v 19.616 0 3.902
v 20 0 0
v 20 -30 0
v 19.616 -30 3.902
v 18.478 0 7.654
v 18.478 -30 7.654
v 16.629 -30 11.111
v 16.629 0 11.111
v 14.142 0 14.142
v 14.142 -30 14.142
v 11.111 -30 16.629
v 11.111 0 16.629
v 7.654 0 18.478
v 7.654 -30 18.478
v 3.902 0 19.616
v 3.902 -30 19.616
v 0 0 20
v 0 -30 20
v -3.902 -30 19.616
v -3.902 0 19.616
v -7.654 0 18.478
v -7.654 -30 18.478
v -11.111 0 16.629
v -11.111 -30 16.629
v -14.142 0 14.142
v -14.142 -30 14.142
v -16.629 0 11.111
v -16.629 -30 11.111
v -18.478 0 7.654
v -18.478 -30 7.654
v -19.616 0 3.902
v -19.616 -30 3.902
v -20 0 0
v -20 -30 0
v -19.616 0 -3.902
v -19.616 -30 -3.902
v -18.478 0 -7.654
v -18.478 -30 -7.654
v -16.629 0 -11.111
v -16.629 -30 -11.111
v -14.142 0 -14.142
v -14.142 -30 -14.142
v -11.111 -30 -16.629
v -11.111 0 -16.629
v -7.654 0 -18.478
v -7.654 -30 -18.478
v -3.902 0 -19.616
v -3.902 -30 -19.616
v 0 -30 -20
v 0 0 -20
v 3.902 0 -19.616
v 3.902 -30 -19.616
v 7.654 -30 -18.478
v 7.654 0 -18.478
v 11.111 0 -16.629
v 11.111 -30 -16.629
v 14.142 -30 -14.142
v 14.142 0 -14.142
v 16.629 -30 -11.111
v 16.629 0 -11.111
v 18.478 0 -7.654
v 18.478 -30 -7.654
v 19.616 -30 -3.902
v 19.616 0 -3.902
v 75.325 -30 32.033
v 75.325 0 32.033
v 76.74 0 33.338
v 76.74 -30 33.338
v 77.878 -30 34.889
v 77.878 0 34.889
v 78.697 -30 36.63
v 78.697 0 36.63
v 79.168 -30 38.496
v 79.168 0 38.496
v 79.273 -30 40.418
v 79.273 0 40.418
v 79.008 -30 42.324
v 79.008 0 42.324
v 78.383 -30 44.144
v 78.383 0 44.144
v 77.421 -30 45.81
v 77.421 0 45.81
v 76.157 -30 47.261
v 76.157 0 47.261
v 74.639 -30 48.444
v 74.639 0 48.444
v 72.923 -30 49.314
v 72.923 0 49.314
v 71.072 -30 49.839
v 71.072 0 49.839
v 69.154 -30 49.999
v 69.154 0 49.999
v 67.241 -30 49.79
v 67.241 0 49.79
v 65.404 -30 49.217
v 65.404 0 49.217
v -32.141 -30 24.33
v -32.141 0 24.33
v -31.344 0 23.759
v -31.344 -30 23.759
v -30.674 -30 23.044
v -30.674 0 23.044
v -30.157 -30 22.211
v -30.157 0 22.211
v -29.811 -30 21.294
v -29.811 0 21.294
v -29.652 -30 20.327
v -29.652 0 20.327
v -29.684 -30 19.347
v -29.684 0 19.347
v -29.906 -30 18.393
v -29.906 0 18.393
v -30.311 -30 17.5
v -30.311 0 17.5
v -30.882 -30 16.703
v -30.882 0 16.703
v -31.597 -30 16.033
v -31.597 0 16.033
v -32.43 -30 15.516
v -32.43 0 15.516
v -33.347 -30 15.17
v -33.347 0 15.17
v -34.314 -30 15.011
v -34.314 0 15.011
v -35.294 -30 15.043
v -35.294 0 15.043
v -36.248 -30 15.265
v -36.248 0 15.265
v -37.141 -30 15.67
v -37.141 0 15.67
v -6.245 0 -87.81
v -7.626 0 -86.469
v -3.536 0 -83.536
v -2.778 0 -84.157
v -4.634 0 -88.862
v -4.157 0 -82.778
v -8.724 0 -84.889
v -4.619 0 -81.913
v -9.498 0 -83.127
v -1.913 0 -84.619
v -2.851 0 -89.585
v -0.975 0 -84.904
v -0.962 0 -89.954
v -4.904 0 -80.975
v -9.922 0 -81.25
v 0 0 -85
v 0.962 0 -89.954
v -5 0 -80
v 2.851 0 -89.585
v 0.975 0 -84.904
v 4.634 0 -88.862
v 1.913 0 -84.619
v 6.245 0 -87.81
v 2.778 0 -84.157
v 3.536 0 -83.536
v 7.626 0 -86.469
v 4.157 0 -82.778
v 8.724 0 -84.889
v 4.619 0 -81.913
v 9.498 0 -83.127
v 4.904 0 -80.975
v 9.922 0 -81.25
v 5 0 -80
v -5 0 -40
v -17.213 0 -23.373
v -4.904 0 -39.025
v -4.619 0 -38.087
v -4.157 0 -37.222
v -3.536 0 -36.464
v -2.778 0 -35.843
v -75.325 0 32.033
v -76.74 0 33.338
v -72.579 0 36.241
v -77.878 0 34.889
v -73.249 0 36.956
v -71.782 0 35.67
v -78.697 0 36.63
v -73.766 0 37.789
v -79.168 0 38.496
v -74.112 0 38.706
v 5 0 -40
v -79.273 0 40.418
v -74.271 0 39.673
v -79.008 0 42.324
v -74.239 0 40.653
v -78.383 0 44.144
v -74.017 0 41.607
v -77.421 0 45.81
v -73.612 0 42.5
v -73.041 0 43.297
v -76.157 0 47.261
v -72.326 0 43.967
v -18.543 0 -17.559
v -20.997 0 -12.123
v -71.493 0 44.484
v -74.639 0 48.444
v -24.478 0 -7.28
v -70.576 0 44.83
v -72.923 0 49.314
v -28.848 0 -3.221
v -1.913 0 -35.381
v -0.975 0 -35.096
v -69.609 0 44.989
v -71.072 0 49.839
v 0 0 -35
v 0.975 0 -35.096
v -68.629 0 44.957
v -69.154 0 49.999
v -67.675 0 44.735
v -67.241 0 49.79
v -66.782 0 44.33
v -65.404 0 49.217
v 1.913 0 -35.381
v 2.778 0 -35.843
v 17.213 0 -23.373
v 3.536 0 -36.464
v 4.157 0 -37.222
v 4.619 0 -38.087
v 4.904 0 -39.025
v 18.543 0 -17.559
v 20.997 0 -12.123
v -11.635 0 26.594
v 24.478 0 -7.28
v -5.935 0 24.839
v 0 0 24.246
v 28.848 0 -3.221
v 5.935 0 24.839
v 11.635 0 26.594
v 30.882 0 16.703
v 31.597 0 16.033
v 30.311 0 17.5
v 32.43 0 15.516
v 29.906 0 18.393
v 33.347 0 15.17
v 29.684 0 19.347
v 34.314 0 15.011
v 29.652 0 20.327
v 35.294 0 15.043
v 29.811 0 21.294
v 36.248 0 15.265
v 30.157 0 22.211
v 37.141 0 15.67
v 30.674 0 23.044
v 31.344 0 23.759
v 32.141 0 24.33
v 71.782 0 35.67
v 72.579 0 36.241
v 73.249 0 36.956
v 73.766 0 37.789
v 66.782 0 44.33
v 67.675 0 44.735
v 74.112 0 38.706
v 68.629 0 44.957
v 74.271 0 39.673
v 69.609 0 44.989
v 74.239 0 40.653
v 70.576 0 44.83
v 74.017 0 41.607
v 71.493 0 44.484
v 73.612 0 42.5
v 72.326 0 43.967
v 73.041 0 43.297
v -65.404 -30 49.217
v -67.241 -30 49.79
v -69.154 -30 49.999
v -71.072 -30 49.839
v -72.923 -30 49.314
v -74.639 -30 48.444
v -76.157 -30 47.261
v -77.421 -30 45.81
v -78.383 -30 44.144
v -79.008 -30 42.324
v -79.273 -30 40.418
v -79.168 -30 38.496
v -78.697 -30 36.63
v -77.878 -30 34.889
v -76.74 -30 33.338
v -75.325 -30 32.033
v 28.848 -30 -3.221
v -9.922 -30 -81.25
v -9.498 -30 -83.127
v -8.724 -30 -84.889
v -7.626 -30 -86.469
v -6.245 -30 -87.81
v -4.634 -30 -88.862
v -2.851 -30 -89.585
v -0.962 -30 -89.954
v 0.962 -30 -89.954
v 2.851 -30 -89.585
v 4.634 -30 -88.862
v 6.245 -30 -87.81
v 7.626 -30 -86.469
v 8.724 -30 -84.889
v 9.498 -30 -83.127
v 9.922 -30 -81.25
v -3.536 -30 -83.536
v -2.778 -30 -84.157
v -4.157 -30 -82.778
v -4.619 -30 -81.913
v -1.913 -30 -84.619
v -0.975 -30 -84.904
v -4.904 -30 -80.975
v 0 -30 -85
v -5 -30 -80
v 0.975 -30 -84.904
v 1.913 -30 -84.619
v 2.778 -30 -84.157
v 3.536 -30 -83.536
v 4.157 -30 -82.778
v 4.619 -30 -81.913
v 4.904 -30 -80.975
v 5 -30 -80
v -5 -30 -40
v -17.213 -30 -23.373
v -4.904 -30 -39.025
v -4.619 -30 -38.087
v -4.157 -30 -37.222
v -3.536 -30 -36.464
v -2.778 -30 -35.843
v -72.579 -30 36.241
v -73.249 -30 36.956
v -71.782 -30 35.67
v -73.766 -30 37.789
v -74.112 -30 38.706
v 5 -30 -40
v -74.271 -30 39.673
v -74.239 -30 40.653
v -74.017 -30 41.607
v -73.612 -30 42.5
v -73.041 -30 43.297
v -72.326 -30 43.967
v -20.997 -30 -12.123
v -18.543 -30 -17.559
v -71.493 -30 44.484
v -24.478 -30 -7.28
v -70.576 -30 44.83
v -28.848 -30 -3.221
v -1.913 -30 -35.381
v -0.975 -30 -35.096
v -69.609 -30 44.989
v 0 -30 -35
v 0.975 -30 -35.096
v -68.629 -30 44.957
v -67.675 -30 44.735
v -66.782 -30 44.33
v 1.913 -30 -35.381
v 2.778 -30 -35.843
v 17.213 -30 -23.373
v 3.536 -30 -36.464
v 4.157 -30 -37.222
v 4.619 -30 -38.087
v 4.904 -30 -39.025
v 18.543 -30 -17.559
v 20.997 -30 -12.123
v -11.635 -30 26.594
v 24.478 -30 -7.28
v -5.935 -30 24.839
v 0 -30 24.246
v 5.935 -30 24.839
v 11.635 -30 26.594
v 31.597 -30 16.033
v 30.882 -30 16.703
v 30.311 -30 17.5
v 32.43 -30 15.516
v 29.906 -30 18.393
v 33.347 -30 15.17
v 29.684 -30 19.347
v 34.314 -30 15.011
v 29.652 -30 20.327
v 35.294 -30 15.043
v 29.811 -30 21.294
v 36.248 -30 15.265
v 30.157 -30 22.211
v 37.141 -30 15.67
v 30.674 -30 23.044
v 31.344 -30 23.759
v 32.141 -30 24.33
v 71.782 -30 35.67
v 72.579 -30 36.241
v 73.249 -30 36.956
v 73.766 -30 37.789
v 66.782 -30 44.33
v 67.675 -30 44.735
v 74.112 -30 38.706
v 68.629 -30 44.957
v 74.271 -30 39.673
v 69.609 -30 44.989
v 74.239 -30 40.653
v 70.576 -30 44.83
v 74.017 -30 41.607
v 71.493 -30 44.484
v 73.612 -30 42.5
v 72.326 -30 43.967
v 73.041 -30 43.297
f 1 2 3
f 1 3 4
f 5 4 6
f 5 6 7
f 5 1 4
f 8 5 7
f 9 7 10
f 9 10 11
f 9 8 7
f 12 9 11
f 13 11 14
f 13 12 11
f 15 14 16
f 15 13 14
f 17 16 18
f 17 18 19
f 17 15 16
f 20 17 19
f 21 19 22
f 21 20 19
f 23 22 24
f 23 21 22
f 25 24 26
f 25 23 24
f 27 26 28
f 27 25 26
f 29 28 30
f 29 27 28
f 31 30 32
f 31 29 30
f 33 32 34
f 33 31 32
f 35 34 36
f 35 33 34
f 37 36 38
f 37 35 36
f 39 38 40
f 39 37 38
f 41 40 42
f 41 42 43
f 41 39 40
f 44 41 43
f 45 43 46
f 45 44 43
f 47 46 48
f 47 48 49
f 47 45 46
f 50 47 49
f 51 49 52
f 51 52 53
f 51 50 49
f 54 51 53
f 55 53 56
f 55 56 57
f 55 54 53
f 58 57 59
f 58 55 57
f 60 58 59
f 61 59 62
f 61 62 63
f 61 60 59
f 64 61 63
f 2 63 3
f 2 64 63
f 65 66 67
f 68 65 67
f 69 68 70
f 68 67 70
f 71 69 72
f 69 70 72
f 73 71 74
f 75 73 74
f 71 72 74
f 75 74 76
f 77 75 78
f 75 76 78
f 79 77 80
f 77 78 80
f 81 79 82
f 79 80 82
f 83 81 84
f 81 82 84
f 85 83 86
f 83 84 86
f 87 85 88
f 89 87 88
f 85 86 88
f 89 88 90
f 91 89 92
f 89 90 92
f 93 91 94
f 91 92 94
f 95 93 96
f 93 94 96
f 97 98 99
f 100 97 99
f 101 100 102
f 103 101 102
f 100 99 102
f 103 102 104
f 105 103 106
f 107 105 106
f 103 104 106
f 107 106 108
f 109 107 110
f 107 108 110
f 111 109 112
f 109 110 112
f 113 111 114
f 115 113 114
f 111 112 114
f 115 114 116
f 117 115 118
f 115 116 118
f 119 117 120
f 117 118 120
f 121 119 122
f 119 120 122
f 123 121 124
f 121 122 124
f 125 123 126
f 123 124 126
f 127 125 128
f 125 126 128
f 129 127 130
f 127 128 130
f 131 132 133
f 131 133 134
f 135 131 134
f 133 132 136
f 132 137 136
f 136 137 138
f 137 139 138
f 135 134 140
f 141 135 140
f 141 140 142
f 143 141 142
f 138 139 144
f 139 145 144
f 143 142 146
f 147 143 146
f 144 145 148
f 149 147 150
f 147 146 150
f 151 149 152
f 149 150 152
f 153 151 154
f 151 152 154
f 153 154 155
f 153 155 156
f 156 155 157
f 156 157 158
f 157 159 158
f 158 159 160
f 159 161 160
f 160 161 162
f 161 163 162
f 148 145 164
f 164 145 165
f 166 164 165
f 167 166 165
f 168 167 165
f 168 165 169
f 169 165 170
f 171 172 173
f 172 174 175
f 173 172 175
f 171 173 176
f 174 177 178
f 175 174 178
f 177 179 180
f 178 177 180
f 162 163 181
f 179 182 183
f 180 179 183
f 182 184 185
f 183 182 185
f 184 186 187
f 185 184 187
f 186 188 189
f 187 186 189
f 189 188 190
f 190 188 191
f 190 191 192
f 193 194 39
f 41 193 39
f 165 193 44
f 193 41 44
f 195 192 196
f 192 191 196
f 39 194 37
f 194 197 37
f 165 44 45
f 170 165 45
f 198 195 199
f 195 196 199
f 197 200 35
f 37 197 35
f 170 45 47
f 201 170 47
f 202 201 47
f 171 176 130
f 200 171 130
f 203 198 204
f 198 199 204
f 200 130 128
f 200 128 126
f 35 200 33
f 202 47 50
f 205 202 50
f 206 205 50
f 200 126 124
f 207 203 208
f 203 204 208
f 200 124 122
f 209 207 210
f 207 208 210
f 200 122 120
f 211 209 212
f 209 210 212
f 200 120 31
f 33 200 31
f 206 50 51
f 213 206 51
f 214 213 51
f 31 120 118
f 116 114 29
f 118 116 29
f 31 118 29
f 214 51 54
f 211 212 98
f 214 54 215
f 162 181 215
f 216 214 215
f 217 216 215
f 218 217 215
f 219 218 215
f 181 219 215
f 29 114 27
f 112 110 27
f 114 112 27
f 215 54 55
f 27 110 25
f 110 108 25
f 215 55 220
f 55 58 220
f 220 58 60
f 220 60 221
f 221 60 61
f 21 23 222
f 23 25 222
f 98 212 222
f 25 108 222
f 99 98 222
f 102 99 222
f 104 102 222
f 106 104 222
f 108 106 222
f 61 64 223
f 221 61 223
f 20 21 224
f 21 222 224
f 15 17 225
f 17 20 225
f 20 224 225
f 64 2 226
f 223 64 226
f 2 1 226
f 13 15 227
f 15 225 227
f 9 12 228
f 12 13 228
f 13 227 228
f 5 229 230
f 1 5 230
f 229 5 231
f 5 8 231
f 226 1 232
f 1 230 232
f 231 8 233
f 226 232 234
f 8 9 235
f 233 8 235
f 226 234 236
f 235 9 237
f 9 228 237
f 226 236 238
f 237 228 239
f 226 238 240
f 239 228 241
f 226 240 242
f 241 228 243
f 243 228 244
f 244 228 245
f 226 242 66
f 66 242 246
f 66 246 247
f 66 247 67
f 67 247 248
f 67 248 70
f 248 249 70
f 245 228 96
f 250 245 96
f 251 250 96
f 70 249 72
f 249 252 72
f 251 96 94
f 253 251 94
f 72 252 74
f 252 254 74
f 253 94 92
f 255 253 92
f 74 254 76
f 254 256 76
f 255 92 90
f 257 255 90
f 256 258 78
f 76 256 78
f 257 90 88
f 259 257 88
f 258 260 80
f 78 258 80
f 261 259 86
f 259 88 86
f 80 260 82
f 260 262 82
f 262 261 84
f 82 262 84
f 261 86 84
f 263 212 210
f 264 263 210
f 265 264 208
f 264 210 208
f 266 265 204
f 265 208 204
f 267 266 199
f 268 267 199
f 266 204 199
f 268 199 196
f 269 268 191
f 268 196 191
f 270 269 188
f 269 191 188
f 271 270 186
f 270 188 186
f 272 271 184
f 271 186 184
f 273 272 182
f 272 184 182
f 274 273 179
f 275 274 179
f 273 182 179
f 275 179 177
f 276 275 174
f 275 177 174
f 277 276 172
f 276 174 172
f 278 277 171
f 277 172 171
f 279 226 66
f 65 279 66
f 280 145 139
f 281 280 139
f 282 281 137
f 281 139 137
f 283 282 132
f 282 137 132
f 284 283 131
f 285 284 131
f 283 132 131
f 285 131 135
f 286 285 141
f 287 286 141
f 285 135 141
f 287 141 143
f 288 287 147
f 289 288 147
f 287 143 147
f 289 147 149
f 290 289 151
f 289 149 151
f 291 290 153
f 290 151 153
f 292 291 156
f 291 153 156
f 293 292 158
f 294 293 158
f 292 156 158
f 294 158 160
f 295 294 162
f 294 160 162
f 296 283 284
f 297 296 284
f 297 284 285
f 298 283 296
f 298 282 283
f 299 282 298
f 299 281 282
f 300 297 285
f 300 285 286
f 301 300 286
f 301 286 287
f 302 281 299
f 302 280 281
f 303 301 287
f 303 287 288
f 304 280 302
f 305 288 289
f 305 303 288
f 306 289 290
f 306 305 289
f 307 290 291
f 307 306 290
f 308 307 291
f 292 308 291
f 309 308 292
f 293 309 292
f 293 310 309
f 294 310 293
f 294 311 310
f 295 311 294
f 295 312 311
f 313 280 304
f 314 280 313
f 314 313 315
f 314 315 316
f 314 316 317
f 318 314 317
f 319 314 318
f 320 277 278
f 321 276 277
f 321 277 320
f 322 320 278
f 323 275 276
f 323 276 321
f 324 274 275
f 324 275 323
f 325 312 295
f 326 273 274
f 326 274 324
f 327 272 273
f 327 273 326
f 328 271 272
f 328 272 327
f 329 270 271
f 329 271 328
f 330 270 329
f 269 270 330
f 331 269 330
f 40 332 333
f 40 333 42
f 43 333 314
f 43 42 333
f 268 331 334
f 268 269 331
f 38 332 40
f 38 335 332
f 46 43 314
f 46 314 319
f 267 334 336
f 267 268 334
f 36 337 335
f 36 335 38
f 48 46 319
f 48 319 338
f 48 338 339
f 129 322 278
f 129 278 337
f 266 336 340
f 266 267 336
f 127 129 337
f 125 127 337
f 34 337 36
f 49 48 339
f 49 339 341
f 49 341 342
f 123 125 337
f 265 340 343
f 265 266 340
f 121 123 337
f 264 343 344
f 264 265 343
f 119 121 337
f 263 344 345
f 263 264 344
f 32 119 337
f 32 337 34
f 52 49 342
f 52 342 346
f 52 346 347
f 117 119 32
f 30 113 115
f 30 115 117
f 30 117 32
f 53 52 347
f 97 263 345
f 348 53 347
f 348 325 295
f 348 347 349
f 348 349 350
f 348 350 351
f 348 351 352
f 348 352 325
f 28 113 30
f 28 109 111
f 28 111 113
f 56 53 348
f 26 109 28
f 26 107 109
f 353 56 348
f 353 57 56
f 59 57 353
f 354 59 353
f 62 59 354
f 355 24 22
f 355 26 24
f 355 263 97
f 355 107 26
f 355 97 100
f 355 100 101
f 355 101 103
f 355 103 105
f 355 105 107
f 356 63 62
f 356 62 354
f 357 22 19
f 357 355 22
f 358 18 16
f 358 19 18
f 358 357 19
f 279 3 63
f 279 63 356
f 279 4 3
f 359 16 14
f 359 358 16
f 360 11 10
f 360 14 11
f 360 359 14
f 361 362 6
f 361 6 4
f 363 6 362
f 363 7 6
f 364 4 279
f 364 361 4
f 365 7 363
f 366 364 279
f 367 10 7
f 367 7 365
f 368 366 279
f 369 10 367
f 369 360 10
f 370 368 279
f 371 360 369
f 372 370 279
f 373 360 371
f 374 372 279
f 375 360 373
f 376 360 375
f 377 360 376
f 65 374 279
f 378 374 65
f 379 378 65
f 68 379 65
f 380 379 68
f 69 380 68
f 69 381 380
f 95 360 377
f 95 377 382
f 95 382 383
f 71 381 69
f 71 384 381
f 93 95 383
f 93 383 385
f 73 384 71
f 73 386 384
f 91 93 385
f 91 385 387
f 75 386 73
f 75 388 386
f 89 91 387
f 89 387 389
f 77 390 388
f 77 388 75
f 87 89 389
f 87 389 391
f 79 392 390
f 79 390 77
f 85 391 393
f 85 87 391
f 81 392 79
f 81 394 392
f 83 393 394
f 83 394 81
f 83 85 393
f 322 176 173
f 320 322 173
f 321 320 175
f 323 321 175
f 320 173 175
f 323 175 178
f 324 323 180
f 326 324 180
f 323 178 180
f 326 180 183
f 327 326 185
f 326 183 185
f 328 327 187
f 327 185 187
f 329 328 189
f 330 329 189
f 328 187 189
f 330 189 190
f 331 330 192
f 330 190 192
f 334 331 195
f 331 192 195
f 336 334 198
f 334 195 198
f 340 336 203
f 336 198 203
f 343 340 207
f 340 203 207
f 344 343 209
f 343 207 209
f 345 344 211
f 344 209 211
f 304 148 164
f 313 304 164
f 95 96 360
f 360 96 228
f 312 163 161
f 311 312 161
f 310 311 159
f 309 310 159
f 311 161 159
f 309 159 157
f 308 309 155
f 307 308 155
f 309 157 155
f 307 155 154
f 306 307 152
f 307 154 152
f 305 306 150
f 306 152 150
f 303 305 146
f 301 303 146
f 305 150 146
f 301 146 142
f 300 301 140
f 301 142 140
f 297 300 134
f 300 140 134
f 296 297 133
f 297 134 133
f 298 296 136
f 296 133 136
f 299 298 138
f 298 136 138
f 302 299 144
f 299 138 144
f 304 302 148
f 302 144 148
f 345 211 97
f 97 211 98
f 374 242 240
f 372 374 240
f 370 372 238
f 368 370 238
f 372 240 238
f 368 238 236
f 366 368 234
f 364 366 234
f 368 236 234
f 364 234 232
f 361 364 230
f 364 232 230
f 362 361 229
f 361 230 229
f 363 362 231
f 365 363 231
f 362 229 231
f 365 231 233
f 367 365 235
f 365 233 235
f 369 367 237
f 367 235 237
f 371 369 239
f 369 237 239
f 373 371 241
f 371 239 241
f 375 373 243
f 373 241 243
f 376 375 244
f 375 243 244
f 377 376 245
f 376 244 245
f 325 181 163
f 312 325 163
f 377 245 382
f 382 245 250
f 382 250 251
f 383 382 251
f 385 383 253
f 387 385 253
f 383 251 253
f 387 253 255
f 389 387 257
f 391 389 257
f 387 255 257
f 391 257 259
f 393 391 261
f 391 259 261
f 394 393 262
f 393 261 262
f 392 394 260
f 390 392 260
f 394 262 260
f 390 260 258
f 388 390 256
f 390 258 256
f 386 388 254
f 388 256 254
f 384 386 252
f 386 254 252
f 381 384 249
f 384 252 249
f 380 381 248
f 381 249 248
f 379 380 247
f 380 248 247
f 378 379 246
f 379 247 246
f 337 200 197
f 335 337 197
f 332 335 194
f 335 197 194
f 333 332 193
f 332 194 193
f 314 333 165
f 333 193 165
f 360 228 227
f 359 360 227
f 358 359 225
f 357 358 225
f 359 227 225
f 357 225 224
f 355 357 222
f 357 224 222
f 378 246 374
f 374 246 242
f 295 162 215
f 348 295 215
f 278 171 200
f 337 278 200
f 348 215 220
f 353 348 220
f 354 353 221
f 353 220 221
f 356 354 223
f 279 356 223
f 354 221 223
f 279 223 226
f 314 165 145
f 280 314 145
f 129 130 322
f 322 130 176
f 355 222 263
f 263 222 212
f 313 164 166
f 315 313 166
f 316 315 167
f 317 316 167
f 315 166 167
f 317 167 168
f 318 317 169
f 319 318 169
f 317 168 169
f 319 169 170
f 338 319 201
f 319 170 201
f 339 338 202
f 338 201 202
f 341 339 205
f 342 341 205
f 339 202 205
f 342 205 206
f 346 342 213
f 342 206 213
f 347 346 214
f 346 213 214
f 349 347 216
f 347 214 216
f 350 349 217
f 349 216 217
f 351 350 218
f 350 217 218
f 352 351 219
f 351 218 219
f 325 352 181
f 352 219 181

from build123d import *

# Parameters (mm, degrees)
F0_R     = 20
F1_DEPTH = 30


with BuildPart() as f1:
    # F0 (on Front) → F1 (new body)
    with BuildSketch(Plane.XZ):
        with BuildLine():
            Line((-11.634756, 26.593659), (-65.40378, 49.217329))
            ThreePointArc((-65.40378, 49.217329), (-77.942286, 45), (-75.325348, 32.032671))
            Line((-75.325348, 32.032671), (-28.848162, -3.220835))
            ThreePointArc((-28.848162, -3.220835), (-20.997346, -12.122824), (-17.213406, -23.372824))
            Line((-17.213406, -23.372824), (-9.921567, -81.25))
            ThreePointArc((-9.921567, -81.25), (0, -90), (9.921567, -81.25))
            Line((9.921567, -81.25), (17.213406, -23.372824))
            ThreePointArc((17.213406, -23.372824), (20.997346, -12.122824), (28.848162, -3.220835))
            Line((28.848162, -3.220835), (75.325348, 32.032671))
            ThreePointArc((75.325348, 32.032671), (77.942286, 45), (65.40378, 49.217329))
            Line((65.40378, 49.217329), (11.634756, 26.593659))
            ThreePointArc((11.634756, 26.593659), (0, 24.245647), (-11.634756, 26.593659))
        make_face()
        with BuildLine():
            ThreePointArc((5, -80), (0, -85), (-5, -80))
            Line((-5, -80), (-5, -40))
            ThreePointArc((-5, -40), (0, -35), (5, -40))
            Line((5, -40), (5, -80))
        make_face(mode=Mode.SUBTRACT)
        with BuildLine():
            ThreePointArc((-71.782032, 35.669873), (-73.612159, 42.5), (-66.782032, 44.330127))
            Line((-66.782032, 44.330127), (-32.141016, 24.330127))
            ThreePointArc((-32.141016, 24.330127), (-30.310889, 17.5), (-37.141016, 15.669873))
            Line((-37.141016, 15.669873), (-71.782032, 35.669873))
        make_face(mode=Mode.SUBTRACT)
        Circle(F0_R, mode=Mode.SUBTRACT)
        with BuildLine():
            ThreePointArc((66.782032, 44.330127), (73.612159, 42.5), (71.782032, 35.669873))
            Line((71.782032, 35.669873), (37.141016, 15.669873))
            ThreePointArc((37.141016, 15.669873), (30.310889, 17.5), (32.141016, 24.330127))
            Line((32.141016, 24.330127), (66.782032, 44.330127))
        make_face(mode=Mode.SUBTRACT)
    extrude(amount=F1_DEPTH)


solid = f1.part
